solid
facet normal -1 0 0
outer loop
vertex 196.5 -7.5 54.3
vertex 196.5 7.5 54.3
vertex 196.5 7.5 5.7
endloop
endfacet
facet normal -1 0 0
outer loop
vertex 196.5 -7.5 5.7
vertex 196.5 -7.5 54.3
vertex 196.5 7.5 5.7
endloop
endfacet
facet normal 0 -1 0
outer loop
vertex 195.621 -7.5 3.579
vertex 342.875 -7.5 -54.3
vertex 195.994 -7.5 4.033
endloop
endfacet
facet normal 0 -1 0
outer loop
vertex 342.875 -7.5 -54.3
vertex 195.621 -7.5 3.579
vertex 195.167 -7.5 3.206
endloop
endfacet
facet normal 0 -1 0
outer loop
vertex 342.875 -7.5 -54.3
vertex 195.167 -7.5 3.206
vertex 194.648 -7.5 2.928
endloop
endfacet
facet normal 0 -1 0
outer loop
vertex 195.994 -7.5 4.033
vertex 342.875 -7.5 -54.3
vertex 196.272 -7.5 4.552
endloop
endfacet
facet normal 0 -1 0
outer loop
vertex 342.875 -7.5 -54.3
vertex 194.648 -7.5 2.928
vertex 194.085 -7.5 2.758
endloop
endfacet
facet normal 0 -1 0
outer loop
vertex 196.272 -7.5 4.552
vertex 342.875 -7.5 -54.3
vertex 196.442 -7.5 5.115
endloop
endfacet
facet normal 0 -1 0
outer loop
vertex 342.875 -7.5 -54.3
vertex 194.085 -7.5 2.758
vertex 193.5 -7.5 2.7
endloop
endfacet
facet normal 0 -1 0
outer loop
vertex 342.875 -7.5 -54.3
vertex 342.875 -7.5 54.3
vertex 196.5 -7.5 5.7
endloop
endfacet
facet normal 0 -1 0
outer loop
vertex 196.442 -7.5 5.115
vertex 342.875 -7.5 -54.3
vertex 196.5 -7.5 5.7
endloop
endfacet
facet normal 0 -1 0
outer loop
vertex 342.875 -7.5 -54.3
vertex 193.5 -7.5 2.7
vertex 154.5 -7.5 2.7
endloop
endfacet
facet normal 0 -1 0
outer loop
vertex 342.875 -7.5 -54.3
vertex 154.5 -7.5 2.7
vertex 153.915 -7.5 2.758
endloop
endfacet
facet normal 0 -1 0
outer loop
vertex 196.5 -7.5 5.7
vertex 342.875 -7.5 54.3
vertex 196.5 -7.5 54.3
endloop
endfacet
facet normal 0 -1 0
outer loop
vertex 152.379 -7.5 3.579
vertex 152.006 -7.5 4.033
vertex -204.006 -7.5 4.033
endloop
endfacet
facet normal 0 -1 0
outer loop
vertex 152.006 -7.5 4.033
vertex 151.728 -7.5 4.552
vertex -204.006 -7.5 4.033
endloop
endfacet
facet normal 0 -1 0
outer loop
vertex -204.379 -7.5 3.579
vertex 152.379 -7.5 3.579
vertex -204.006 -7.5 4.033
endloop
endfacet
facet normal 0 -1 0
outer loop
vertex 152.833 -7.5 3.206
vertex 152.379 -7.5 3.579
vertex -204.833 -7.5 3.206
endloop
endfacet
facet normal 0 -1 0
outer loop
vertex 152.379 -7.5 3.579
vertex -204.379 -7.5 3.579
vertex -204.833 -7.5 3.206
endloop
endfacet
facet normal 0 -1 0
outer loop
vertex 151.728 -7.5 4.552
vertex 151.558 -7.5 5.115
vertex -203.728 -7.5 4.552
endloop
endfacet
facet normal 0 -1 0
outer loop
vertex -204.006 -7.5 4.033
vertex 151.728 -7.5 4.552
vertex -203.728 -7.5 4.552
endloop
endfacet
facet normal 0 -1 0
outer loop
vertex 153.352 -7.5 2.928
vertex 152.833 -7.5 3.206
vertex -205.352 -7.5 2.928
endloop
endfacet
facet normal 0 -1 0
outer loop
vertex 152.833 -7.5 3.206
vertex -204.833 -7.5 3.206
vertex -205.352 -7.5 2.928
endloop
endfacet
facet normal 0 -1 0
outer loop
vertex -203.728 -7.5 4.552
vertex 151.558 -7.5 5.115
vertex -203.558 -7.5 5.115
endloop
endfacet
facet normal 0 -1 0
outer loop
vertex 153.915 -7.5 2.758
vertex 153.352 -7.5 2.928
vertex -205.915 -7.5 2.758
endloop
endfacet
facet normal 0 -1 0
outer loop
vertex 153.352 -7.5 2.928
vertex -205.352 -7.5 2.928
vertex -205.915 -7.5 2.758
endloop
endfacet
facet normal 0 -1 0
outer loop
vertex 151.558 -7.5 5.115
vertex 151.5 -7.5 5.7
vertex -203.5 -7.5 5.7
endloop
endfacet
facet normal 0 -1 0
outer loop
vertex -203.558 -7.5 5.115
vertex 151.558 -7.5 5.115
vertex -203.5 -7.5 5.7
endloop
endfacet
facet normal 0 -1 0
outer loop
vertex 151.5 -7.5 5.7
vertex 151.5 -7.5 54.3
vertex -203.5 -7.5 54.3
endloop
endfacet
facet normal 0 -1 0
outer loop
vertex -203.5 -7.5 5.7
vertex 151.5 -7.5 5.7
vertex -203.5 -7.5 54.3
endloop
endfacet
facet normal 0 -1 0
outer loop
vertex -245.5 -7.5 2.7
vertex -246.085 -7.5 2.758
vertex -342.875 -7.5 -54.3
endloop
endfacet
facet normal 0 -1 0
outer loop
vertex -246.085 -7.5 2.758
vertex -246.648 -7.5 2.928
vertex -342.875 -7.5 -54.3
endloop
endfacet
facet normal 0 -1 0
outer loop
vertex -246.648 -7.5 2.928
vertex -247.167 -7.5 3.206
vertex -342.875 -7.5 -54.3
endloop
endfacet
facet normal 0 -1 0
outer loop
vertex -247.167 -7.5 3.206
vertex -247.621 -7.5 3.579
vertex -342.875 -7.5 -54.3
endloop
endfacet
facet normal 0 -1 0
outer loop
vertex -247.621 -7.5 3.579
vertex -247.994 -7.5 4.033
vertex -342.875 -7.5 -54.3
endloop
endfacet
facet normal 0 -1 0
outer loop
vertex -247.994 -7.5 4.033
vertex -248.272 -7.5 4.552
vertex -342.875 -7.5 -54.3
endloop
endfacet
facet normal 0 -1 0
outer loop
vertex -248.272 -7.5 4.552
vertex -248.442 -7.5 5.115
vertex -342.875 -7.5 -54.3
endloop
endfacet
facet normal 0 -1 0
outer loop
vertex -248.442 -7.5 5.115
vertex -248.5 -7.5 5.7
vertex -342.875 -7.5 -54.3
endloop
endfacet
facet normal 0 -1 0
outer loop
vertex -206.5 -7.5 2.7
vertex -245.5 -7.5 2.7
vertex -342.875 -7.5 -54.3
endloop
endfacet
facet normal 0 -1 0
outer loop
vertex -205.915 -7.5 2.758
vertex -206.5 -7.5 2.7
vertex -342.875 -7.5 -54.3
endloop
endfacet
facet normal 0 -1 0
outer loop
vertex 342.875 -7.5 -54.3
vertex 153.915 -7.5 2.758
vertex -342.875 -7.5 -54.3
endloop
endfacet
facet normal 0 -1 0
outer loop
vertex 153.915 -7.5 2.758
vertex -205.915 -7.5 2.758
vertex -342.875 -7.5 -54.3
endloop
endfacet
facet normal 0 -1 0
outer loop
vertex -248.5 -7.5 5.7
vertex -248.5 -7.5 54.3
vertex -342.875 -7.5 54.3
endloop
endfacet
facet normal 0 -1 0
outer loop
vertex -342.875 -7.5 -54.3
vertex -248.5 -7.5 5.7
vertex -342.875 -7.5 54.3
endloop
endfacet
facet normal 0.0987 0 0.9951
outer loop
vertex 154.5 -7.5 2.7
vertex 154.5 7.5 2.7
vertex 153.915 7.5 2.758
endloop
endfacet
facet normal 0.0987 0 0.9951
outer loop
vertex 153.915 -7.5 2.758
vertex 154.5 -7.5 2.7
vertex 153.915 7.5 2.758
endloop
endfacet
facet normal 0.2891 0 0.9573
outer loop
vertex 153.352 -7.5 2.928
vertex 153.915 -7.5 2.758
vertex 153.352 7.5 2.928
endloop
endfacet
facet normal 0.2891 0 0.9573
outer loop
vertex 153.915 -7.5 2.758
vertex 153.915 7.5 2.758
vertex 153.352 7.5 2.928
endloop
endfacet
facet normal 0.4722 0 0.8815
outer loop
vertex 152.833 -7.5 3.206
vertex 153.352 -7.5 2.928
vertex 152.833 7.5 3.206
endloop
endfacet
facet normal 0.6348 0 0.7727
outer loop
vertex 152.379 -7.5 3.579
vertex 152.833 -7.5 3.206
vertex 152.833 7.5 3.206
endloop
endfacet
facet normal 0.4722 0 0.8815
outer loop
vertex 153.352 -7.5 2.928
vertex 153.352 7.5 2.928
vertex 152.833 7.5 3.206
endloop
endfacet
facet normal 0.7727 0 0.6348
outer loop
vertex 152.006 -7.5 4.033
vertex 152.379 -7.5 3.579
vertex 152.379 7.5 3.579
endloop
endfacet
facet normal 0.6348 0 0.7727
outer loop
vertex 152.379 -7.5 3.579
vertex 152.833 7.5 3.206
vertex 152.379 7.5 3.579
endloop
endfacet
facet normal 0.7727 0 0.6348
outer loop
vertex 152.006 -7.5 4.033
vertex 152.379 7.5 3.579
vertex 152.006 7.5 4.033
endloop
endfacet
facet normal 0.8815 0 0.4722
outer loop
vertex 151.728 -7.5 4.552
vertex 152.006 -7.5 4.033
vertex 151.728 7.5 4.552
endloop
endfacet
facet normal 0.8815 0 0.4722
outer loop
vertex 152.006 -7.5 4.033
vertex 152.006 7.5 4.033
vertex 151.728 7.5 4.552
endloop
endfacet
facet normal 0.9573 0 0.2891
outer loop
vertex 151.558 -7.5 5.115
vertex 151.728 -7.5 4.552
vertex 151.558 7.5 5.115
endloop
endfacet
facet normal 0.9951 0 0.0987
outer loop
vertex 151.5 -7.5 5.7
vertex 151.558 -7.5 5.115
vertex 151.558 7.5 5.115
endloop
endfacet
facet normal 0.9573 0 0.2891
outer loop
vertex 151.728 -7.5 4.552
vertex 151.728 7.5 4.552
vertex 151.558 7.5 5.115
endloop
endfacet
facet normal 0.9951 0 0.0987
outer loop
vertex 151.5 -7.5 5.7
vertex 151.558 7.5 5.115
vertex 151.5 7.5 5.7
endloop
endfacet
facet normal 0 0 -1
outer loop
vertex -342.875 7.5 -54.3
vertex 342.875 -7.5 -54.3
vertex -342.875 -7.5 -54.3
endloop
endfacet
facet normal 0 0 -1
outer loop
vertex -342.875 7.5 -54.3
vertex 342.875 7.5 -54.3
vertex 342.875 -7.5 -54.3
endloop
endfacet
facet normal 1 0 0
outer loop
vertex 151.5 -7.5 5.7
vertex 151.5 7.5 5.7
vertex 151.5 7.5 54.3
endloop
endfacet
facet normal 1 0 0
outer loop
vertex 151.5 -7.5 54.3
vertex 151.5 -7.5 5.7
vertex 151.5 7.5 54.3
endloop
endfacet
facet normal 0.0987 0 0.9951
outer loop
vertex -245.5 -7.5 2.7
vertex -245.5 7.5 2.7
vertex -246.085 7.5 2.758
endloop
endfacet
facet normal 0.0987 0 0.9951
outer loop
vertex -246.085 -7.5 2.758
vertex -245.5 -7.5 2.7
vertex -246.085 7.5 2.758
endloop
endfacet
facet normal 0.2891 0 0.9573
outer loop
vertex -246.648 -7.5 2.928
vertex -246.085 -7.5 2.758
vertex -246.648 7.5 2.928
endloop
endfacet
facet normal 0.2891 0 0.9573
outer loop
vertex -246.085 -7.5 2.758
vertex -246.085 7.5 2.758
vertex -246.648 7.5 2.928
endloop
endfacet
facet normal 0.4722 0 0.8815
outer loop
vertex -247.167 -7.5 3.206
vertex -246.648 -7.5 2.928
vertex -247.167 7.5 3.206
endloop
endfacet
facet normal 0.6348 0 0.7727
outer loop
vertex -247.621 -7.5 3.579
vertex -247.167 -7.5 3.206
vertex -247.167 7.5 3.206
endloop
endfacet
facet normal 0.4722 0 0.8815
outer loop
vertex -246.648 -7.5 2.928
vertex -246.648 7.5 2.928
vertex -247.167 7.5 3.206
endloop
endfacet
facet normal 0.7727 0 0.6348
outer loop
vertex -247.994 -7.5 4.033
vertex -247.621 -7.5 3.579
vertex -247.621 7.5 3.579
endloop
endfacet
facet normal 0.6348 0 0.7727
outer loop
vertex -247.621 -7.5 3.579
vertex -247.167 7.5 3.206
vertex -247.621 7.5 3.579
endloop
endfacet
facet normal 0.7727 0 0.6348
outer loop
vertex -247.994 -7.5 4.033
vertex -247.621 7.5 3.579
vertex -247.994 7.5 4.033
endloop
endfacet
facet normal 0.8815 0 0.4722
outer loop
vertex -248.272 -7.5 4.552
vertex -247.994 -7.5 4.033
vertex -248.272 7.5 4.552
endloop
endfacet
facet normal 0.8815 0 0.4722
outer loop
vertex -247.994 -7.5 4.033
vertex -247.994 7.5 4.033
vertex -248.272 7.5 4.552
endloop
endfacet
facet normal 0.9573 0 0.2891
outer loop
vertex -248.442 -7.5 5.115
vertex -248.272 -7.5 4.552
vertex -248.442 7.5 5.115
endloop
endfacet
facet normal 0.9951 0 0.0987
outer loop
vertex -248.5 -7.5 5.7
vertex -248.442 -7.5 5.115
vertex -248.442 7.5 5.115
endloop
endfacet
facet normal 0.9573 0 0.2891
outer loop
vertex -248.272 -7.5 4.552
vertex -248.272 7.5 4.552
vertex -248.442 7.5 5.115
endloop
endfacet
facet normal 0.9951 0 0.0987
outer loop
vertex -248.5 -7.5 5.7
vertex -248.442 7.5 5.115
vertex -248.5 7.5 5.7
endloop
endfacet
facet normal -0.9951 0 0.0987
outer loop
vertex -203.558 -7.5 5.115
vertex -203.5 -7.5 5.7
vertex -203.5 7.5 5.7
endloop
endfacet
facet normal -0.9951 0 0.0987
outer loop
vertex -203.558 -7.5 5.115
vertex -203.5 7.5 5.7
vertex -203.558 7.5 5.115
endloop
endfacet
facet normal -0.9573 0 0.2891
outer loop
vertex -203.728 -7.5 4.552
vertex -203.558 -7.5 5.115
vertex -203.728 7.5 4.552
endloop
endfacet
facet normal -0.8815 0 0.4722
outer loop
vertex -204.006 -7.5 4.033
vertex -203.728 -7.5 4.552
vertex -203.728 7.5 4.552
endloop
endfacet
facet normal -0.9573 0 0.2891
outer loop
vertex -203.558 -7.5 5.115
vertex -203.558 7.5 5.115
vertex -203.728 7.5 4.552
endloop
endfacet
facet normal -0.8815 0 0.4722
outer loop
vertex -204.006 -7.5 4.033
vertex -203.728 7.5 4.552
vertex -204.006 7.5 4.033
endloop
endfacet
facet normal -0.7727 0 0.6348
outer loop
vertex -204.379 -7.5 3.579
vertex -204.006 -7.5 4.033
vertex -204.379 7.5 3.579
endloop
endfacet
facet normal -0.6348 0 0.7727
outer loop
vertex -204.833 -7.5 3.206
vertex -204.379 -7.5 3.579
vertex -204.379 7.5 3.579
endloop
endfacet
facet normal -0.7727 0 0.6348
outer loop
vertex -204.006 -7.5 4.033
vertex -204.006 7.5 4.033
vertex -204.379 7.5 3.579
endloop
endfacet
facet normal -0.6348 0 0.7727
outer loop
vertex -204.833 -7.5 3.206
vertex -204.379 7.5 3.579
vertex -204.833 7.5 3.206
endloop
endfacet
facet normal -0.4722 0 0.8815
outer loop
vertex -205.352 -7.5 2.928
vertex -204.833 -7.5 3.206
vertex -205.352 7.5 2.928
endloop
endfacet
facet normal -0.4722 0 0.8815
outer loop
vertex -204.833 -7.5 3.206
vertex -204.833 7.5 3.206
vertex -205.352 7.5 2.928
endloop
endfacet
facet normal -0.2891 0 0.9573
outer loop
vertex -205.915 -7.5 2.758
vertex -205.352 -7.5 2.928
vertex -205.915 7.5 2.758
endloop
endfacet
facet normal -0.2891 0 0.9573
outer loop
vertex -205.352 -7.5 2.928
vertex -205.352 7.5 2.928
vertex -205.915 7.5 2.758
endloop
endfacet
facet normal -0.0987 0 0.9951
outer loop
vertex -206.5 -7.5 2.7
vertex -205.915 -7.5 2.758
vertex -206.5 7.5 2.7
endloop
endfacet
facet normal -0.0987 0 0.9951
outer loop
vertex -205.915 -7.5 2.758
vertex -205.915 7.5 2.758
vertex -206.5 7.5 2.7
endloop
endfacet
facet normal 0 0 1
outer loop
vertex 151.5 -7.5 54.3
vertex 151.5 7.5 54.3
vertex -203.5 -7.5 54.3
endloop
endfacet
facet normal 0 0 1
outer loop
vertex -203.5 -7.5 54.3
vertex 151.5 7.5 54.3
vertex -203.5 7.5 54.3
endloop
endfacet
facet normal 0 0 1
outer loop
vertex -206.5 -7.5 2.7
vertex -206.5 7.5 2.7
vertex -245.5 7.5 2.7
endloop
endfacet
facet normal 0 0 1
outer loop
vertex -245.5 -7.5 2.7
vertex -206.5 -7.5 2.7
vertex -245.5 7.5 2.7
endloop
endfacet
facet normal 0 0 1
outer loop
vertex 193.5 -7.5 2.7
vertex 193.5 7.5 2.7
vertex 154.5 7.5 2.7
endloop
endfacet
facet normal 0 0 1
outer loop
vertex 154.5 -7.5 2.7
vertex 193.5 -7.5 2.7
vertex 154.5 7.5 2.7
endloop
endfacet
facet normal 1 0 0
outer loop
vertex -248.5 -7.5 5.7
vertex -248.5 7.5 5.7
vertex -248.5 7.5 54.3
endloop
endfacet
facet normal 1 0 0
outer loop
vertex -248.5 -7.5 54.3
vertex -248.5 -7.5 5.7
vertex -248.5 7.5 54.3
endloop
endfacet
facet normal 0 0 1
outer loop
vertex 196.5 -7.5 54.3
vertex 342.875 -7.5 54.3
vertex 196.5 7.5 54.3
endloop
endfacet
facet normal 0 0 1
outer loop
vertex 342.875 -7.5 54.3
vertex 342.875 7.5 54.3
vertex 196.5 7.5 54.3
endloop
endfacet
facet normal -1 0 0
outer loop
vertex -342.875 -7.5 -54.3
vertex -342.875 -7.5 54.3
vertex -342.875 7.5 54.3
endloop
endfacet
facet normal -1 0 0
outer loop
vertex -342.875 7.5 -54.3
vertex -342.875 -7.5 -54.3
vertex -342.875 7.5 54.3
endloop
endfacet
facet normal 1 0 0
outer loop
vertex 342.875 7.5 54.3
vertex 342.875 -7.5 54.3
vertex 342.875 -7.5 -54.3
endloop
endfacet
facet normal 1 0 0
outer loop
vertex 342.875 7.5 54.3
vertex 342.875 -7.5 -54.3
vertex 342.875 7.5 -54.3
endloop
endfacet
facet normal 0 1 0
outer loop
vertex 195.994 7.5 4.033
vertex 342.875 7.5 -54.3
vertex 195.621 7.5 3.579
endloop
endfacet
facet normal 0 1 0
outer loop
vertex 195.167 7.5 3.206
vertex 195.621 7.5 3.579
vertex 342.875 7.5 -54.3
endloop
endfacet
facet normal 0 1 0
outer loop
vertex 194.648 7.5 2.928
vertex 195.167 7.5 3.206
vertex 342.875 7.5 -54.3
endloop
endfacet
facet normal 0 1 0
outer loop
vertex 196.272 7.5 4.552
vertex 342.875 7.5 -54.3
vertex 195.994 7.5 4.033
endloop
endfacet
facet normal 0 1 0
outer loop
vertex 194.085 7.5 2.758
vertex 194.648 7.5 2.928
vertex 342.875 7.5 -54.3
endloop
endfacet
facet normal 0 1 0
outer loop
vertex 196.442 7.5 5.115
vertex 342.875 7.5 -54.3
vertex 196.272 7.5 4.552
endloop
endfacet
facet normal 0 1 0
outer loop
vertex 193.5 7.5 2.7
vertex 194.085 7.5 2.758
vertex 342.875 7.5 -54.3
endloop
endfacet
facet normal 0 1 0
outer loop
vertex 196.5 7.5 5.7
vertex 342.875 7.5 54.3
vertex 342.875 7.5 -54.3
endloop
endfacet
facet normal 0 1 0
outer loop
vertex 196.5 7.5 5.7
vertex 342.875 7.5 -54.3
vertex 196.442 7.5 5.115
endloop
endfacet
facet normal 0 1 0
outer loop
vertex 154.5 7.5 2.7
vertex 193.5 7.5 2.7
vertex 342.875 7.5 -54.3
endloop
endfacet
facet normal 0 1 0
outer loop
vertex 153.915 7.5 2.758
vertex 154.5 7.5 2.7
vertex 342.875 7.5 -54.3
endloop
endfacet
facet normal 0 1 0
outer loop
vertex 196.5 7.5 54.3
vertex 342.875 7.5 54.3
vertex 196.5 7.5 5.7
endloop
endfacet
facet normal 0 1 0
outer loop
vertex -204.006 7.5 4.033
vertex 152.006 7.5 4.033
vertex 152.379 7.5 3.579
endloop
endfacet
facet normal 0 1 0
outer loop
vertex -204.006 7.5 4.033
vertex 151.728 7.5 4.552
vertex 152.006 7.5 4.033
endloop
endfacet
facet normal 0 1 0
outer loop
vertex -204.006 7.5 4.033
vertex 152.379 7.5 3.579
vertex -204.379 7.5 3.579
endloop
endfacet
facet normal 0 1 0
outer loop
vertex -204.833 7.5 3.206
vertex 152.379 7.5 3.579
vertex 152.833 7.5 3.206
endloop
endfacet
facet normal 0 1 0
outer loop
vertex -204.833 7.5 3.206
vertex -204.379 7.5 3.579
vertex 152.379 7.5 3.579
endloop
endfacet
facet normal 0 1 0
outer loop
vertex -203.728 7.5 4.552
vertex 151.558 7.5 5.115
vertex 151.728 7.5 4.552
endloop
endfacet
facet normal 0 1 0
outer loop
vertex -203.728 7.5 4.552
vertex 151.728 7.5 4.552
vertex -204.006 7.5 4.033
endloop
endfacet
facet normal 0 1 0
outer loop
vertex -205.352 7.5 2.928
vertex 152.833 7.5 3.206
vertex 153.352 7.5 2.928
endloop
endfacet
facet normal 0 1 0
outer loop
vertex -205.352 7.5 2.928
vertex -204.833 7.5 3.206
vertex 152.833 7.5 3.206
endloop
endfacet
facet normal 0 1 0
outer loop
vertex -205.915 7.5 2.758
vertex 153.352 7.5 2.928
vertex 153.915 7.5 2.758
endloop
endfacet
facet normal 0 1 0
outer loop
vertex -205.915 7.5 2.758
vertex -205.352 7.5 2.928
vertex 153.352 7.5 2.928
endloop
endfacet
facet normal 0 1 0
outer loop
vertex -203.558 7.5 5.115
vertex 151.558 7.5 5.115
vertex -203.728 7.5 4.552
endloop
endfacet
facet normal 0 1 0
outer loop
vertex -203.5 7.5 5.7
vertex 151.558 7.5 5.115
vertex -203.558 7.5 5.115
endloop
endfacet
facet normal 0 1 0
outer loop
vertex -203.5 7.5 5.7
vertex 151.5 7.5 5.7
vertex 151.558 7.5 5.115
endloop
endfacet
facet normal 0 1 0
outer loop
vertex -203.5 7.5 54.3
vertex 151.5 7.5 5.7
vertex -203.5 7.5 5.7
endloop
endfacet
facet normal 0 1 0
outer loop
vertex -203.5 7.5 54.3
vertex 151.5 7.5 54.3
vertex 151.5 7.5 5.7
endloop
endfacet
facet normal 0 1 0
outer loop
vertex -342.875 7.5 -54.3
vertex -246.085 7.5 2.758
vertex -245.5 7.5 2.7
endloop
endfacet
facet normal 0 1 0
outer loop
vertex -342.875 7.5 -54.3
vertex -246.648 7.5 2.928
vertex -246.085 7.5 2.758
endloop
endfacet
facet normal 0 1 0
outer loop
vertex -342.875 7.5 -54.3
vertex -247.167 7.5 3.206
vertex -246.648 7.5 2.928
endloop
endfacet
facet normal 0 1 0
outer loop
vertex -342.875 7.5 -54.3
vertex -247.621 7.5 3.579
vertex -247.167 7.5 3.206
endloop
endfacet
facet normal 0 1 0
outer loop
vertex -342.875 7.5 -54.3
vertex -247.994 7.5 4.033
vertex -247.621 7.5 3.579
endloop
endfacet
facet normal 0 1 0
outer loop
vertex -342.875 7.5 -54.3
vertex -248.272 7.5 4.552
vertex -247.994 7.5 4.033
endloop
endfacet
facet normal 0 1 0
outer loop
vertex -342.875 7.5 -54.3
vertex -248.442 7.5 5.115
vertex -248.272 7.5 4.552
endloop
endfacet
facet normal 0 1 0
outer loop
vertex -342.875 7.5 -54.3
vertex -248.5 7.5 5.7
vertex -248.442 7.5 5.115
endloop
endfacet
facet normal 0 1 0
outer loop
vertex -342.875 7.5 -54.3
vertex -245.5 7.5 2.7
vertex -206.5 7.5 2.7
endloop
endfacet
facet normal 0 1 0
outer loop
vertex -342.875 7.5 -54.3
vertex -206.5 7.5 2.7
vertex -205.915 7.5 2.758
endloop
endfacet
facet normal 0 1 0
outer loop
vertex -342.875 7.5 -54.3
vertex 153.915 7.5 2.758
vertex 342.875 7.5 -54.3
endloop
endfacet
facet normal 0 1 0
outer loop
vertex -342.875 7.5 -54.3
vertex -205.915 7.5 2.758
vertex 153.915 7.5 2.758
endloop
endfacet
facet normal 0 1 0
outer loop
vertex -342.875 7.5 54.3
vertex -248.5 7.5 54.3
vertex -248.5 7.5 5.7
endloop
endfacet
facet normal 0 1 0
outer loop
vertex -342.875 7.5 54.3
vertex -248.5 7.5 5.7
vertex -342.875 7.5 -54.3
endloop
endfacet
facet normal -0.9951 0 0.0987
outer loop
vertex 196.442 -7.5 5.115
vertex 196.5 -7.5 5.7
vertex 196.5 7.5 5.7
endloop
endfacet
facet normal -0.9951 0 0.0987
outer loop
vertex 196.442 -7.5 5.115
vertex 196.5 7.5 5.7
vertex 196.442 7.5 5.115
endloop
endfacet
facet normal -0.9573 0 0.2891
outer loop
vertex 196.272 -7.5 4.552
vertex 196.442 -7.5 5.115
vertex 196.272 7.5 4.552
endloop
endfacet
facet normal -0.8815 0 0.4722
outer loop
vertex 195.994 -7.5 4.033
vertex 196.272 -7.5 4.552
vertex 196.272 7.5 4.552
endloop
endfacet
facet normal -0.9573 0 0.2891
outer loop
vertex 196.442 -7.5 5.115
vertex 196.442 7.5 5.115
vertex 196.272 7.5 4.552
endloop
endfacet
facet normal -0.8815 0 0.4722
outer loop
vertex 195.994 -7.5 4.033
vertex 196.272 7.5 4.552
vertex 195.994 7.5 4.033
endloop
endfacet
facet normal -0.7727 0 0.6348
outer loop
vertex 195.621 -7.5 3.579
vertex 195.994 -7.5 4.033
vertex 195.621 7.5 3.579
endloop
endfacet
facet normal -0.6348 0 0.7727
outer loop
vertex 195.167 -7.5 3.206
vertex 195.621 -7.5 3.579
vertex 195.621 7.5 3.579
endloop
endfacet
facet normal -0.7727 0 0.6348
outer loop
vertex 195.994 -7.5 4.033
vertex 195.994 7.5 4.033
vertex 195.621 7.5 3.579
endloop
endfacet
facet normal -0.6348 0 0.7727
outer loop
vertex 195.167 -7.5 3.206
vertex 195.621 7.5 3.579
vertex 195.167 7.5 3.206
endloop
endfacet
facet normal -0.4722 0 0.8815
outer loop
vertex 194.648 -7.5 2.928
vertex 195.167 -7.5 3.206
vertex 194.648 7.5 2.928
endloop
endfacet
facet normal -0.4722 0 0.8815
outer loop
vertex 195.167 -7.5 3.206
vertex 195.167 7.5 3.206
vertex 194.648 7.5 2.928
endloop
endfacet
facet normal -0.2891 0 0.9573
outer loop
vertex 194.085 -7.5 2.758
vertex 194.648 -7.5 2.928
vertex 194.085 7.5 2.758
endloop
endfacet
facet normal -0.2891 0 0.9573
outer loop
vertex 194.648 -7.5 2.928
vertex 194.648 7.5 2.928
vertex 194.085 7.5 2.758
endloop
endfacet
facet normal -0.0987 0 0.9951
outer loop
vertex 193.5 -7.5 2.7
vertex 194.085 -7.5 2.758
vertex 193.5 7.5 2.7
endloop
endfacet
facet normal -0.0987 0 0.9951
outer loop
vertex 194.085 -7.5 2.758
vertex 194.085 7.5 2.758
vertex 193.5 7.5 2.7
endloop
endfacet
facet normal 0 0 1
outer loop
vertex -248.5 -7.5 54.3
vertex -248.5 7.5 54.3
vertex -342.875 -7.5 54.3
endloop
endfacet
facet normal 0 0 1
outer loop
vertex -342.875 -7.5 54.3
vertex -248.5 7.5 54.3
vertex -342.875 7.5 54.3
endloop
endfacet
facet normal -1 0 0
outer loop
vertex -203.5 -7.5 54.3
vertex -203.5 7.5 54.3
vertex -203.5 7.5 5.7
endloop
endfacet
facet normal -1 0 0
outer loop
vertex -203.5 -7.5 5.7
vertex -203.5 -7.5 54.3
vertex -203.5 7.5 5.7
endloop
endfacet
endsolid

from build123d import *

# Parameters (mm, degrees)
F0_W     = 342.875
F0_H     = 15
F1_DEPTH = 54.3
F4_DEPTH = 15


with BuildPart() as f1:
    # F0 (on Top) → F1 (new body, symmetric)
    with BuildSketch(Plane.XY):
        with Locations((171.4375, 0)):
            Rectangle(F0_W, F0_H)
    extrude(amount=F1_DEPTH, both=True)

    # F2: F1 across face


with BuildPart() as f1_1:
    add(f1.part)
    add(f1.part.mirror(Plane(origin=(0, 0, 0), x_dir=(0, -1, 0), z_dir=(-1, 0, 0))))

    # F3 (on face) → F4 (cut, through all)
    with BuildSketch(Plane(origin=(0, 7.5, 0), x_dir=(-1, 0, 0), z_dir=(0, 1, 0))):
        with BuildLine():
            Line((-151.5, 54.3), (-196.5, 54.3))
            Line((-196.5, 54.3), (-196.5, 5.7))
            ThreePointArc((-196.5, 5.7), (-195.62132, 3.57868), (-193.5, 2.7))
            Line((-193.5, 2.7), (-154.5, 2.7))
            ThreePointArc((-154.5, 2.7), (-152.37868, 3.57868), (-151.5, 5.7))
            Line((-151.5, 5.7), (-151.5, 54.3))
        make_face()
        with BuildLine():
            Line((248.5, 54.3), (203.5, 54.3))
            Line((203.5, 54.3), (203.5, 5.7))
            ThreePointArc((203.5, 5.7), (204.37868, 3.57868), (206.5, 2.7))
            Line((206.5, 2.7), (245.5, 2.7))
            ThreePointArc((245.5, 2.7), (247.62132, 3.57868), (248.5, 5.7))
            Line((248.5, 5.7), (248.5, 54.3))
        make_face()
    extrude(amount=-F4_DEPTH, mode=Mode.SUBTRACT)


solid = f1_1.part
